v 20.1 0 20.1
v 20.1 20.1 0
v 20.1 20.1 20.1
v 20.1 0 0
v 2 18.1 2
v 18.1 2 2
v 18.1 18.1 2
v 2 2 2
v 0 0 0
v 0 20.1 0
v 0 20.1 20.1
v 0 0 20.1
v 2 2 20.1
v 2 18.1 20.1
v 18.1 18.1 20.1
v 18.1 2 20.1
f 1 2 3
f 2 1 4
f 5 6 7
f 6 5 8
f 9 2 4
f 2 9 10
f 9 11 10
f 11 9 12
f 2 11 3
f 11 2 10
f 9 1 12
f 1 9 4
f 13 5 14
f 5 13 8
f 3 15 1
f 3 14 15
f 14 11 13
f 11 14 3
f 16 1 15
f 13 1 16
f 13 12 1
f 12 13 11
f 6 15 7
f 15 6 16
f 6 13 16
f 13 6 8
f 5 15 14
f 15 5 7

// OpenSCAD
/*
Exercício 2:
Criar uma caixa com dimensões parametrizadas 
usando cube(), union() e translate()
*/

Espessura = 2;
Altura = 20.1;        //dimensão na direção Z
Largura = 20.1;       //dimensão na direção X
Comprimento = 20.1;   //dimensão na direção Y

//base
cube([Largura,Comprimento,Espessura]);

//lateral esquerda
cube([Espessura,Comprimento,Altura]);

//lateral direita
translate([Largura - Espessura,0,0]) cube([Espessura,Comprimento,Altura]);

//frente
cube([Largura,Espessura,Altura]);

//fundo
translate([0,Comprimento - Espessura,0]) cube([Largura,Espessura,Altura]);
